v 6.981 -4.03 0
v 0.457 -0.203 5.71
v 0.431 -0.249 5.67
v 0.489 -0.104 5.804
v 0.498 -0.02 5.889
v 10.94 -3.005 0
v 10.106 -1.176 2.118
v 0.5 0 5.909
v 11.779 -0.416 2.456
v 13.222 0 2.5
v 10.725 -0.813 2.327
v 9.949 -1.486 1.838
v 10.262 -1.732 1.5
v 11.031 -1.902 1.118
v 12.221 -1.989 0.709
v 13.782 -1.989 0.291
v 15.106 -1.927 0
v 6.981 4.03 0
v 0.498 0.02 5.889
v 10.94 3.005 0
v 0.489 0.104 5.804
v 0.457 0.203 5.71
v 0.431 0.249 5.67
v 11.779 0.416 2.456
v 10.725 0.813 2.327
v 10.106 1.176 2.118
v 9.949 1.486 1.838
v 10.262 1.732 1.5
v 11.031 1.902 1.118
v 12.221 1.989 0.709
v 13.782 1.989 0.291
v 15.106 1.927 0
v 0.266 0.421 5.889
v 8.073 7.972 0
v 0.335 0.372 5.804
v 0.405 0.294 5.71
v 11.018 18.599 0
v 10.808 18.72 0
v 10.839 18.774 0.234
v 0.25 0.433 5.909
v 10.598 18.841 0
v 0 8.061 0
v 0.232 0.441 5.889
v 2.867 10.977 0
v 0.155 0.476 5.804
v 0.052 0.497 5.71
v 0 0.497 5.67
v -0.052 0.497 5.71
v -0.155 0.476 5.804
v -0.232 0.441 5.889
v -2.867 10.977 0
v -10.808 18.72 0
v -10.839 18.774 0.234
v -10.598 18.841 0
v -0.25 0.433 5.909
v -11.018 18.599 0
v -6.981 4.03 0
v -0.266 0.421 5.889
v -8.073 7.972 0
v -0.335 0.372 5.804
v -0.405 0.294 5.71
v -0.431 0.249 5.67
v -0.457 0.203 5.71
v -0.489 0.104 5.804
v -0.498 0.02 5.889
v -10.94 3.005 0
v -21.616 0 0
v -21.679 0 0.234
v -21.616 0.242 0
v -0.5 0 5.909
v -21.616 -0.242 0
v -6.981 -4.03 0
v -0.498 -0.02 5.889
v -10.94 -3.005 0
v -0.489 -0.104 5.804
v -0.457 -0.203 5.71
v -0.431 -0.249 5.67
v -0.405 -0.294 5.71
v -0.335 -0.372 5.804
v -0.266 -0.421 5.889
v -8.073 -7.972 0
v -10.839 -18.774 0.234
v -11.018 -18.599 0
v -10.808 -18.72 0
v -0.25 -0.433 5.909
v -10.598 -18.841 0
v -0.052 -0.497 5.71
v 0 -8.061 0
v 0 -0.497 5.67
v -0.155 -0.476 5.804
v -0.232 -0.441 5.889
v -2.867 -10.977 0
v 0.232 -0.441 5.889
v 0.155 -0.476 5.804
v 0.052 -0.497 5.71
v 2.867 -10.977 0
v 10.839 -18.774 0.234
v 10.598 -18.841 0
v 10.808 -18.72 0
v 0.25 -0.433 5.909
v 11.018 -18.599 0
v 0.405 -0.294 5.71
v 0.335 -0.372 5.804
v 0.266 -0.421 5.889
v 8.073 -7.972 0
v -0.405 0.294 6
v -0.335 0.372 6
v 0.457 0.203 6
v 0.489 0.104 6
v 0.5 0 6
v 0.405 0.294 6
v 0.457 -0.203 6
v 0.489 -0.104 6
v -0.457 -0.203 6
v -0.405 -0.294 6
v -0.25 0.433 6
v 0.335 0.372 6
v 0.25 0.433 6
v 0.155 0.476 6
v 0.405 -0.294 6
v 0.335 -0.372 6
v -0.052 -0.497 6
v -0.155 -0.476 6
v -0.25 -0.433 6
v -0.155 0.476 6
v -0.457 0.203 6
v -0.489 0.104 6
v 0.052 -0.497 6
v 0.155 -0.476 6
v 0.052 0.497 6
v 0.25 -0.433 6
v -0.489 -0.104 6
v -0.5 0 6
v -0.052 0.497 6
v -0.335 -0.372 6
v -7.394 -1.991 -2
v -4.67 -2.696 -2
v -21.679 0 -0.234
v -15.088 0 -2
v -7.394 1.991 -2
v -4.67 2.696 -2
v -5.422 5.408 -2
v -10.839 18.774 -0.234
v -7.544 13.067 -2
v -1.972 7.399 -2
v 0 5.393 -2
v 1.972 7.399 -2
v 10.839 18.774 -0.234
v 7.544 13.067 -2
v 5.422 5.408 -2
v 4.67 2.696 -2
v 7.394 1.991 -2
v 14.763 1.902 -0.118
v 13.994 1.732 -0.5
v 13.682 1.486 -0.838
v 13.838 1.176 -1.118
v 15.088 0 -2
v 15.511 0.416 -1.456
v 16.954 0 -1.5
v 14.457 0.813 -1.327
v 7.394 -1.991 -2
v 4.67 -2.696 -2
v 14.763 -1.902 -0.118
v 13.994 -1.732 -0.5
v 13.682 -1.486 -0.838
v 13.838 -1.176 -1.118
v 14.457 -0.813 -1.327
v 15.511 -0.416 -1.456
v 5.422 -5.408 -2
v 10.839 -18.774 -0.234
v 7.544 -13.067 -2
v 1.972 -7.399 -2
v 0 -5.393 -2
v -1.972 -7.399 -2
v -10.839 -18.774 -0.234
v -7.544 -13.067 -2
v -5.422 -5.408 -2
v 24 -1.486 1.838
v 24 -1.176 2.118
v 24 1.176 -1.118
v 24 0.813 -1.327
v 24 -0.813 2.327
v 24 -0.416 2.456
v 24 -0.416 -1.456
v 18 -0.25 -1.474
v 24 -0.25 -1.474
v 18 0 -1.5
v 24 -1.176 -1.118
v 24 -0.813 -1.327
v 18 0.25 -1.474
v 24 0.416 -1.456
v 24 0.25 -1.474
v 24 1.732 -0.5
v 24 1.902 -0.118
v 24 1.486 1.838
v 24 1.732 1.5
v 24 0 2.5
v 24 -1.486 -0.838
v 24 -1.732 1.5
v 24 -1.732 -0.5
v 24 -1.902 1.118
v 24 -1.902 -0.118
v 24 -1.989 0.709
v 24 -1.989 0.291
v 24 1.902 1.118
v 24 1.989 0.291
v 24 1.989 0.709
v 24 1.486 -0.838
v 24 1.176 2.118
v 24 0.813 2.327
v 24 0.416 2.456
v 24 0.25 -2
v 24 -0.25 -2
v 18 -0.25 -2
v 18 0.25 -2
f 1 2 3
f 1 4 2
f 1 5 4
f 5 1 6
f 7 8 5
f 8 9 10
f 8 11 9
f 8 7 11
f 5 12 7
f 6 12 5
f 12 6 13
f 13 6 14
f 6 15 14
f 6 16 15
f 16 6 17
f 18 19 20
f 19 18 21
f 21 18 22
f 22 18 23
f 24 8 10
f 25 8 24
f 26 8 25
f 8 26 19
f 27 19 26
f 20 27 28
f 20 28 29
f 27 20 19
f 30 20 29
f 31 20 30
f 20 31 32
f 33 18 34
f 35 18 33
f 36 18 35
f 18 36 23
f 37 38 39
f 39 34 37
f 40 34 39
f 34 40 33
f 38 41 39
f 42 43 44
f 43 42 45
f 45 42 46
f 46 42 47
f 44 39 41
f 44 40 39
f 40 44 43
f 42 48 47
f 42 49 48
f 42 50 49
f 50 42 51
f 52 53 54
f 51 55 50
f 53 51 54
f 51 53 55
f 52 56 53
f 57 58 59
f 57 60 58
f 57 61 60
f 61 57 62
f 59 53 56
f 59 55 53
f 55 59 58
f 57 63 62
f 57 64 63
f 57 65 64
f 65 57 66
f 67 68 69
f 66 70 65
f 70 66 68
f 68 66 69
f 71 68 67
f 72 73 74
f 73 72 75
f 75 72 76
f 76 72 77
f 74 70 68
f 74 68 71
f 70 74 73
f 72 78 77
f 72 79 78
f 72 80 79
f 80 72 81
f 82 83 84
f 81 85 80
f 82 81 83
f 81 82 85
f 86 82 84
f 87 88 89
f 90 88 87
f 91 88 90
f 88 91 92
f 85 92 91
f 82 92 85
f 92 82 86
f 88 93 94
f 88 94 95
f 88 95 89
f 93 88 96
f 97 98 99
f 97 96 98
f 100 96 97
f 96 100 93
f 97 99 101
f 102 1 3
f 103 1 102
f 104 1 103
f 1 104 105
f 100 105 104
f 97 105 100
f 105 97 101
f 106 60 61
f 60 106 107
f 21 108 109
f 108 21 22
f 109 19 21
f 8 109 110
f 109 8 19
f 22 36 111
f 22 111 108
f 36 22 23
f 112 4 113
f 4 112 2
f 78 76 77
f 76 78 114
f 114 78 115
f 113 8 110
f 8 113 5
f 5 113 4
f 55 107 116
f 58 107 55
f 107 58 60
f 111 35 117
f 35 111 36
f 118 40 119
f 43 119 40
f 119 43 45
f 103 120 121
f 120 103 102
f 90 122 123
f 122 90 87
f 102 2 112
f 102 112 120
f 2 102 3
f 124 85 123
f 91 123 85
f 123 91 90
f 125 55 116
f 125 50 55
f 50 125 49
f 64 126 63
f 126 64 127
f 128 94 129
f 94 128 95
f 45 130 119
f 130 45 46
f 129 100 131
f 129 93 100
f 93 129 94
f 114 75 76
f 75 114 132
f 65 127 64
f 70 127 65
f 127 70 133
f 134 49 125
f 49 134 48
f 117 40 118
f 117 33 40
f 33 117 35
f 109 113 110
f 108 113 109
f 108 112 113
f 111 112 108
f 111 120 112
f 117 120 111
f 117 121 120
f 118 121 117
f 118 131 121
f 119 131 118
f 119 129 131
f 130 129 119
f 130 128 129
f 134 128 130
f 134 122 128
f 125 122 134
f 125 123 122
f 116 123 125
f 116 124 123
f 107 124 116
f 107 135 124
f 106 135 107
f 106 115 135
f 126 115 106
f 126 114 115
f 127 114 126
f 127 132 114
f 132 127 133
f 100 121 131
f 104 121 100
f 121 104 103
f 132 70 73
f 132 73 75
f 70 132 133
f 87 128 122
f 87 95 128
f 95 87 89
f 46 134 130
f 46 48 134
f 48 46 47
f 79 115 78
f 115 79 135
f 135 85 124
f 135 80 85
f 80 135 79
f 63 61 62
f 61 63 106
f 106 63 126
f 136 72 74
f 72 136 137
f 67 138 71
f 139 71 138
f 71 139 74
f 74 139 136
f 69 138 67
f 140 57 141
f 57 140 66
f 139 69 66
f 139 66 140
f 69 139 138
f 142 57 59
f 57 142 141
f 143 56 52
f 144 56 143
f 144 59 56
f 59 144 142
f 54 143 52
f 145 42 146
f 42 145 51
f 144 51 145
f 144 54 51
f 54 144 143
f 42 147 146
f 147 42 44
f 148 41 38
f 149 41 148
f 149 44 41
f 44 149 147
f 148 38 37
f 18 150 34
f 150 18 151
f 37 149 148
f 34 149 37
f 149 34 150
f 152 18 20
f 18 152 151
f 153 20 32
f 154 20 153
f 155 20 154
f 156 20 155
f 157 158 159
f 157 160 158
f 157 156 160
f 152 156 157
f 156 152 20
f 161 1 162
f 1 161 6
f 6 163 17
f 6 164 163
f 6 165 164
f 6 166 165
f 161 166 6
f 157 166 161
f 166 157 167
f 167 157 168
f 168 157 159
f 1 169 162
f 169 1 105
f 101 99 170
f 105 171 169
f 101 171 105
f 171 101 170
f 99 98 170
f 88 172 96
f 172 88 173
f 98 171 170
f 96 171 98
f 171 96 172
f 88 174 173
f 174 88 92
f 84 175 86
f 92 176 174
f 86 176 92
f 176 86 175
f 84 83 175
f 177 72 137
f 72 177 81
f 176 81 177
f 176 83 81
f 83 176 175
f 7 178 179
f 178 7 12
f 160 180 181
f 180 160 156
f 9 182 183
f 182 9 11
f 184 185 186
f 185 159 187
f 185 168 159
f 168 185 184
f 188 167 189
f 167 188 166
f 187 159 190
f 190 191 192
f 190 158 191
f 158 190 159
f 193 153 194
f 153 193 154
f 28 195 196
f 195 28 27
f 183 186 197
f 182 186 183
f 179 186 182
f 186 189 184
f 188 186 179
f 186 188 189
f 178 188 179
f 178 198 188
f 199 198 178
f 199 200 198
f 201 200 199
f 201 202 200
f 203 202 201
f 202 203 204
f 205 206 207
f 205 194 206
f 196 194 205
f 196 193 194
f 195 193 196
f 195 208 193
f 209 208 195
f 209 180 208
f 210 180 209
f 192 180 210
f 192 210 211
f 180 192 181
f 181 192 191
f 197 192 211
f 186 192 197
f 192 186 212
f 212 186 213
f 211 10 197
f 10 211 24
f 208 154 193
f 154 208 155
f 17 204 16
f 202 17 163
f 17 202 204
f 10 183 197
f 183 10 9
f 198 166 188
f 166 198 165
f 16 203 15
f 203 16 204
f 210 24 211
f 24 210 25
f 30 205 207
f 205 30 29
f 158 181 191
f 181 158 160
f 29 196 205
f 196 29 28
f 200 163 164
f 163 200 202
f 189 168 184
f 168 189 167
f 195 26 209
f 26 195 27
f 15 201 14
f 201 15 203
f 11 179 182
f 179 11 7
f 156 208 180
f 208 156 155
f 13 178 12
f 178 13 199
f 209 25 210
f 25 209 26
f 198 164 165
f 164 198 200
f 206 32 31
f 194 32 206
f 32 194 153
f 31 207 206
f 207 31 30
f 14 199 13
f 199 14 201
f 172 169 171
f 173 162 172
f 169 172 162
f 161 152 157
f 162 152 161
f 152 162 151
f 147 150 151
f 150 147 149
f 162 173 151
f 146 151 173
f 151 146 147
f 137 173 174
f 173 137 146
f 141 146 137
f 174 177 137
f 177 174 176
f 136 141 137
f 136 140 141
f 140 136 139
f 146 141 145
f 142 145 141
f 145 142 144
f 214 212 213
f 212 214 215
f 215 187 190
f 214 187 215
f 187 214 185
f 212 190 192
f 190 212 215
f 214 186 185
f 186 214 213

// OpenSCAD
$fn=30;
module point() {
  translate([-2.5,0,-5])
  difference() {
    rotate([45,15,0]) cube([22,8,8]);
    translate([0,0,-5]) cube([50,40,20],center=true);
  }
}
module star() {
  cylinder(r=.5,h=6);
  rotate([0,0,0]) point();
  rotate([0,0,60]) point();
  rotate([0,0,120]) point();
  rotate([0,0,180]) point();
  rotate([0,0,240]) point();
  rotate([0,0,300]) point();
}

module assy() {
  translate([2,0,0.5]) rotate([0,90,0])  cylinder(r=2,h=22);
  rotate([0,180,0]) star();
  star();
}
difference() {
 assy();
 translate([-25,-25,-12]) cube([50,50,10]);
}
translate([18,-.25,-2]) cube([6,.5,2]);
